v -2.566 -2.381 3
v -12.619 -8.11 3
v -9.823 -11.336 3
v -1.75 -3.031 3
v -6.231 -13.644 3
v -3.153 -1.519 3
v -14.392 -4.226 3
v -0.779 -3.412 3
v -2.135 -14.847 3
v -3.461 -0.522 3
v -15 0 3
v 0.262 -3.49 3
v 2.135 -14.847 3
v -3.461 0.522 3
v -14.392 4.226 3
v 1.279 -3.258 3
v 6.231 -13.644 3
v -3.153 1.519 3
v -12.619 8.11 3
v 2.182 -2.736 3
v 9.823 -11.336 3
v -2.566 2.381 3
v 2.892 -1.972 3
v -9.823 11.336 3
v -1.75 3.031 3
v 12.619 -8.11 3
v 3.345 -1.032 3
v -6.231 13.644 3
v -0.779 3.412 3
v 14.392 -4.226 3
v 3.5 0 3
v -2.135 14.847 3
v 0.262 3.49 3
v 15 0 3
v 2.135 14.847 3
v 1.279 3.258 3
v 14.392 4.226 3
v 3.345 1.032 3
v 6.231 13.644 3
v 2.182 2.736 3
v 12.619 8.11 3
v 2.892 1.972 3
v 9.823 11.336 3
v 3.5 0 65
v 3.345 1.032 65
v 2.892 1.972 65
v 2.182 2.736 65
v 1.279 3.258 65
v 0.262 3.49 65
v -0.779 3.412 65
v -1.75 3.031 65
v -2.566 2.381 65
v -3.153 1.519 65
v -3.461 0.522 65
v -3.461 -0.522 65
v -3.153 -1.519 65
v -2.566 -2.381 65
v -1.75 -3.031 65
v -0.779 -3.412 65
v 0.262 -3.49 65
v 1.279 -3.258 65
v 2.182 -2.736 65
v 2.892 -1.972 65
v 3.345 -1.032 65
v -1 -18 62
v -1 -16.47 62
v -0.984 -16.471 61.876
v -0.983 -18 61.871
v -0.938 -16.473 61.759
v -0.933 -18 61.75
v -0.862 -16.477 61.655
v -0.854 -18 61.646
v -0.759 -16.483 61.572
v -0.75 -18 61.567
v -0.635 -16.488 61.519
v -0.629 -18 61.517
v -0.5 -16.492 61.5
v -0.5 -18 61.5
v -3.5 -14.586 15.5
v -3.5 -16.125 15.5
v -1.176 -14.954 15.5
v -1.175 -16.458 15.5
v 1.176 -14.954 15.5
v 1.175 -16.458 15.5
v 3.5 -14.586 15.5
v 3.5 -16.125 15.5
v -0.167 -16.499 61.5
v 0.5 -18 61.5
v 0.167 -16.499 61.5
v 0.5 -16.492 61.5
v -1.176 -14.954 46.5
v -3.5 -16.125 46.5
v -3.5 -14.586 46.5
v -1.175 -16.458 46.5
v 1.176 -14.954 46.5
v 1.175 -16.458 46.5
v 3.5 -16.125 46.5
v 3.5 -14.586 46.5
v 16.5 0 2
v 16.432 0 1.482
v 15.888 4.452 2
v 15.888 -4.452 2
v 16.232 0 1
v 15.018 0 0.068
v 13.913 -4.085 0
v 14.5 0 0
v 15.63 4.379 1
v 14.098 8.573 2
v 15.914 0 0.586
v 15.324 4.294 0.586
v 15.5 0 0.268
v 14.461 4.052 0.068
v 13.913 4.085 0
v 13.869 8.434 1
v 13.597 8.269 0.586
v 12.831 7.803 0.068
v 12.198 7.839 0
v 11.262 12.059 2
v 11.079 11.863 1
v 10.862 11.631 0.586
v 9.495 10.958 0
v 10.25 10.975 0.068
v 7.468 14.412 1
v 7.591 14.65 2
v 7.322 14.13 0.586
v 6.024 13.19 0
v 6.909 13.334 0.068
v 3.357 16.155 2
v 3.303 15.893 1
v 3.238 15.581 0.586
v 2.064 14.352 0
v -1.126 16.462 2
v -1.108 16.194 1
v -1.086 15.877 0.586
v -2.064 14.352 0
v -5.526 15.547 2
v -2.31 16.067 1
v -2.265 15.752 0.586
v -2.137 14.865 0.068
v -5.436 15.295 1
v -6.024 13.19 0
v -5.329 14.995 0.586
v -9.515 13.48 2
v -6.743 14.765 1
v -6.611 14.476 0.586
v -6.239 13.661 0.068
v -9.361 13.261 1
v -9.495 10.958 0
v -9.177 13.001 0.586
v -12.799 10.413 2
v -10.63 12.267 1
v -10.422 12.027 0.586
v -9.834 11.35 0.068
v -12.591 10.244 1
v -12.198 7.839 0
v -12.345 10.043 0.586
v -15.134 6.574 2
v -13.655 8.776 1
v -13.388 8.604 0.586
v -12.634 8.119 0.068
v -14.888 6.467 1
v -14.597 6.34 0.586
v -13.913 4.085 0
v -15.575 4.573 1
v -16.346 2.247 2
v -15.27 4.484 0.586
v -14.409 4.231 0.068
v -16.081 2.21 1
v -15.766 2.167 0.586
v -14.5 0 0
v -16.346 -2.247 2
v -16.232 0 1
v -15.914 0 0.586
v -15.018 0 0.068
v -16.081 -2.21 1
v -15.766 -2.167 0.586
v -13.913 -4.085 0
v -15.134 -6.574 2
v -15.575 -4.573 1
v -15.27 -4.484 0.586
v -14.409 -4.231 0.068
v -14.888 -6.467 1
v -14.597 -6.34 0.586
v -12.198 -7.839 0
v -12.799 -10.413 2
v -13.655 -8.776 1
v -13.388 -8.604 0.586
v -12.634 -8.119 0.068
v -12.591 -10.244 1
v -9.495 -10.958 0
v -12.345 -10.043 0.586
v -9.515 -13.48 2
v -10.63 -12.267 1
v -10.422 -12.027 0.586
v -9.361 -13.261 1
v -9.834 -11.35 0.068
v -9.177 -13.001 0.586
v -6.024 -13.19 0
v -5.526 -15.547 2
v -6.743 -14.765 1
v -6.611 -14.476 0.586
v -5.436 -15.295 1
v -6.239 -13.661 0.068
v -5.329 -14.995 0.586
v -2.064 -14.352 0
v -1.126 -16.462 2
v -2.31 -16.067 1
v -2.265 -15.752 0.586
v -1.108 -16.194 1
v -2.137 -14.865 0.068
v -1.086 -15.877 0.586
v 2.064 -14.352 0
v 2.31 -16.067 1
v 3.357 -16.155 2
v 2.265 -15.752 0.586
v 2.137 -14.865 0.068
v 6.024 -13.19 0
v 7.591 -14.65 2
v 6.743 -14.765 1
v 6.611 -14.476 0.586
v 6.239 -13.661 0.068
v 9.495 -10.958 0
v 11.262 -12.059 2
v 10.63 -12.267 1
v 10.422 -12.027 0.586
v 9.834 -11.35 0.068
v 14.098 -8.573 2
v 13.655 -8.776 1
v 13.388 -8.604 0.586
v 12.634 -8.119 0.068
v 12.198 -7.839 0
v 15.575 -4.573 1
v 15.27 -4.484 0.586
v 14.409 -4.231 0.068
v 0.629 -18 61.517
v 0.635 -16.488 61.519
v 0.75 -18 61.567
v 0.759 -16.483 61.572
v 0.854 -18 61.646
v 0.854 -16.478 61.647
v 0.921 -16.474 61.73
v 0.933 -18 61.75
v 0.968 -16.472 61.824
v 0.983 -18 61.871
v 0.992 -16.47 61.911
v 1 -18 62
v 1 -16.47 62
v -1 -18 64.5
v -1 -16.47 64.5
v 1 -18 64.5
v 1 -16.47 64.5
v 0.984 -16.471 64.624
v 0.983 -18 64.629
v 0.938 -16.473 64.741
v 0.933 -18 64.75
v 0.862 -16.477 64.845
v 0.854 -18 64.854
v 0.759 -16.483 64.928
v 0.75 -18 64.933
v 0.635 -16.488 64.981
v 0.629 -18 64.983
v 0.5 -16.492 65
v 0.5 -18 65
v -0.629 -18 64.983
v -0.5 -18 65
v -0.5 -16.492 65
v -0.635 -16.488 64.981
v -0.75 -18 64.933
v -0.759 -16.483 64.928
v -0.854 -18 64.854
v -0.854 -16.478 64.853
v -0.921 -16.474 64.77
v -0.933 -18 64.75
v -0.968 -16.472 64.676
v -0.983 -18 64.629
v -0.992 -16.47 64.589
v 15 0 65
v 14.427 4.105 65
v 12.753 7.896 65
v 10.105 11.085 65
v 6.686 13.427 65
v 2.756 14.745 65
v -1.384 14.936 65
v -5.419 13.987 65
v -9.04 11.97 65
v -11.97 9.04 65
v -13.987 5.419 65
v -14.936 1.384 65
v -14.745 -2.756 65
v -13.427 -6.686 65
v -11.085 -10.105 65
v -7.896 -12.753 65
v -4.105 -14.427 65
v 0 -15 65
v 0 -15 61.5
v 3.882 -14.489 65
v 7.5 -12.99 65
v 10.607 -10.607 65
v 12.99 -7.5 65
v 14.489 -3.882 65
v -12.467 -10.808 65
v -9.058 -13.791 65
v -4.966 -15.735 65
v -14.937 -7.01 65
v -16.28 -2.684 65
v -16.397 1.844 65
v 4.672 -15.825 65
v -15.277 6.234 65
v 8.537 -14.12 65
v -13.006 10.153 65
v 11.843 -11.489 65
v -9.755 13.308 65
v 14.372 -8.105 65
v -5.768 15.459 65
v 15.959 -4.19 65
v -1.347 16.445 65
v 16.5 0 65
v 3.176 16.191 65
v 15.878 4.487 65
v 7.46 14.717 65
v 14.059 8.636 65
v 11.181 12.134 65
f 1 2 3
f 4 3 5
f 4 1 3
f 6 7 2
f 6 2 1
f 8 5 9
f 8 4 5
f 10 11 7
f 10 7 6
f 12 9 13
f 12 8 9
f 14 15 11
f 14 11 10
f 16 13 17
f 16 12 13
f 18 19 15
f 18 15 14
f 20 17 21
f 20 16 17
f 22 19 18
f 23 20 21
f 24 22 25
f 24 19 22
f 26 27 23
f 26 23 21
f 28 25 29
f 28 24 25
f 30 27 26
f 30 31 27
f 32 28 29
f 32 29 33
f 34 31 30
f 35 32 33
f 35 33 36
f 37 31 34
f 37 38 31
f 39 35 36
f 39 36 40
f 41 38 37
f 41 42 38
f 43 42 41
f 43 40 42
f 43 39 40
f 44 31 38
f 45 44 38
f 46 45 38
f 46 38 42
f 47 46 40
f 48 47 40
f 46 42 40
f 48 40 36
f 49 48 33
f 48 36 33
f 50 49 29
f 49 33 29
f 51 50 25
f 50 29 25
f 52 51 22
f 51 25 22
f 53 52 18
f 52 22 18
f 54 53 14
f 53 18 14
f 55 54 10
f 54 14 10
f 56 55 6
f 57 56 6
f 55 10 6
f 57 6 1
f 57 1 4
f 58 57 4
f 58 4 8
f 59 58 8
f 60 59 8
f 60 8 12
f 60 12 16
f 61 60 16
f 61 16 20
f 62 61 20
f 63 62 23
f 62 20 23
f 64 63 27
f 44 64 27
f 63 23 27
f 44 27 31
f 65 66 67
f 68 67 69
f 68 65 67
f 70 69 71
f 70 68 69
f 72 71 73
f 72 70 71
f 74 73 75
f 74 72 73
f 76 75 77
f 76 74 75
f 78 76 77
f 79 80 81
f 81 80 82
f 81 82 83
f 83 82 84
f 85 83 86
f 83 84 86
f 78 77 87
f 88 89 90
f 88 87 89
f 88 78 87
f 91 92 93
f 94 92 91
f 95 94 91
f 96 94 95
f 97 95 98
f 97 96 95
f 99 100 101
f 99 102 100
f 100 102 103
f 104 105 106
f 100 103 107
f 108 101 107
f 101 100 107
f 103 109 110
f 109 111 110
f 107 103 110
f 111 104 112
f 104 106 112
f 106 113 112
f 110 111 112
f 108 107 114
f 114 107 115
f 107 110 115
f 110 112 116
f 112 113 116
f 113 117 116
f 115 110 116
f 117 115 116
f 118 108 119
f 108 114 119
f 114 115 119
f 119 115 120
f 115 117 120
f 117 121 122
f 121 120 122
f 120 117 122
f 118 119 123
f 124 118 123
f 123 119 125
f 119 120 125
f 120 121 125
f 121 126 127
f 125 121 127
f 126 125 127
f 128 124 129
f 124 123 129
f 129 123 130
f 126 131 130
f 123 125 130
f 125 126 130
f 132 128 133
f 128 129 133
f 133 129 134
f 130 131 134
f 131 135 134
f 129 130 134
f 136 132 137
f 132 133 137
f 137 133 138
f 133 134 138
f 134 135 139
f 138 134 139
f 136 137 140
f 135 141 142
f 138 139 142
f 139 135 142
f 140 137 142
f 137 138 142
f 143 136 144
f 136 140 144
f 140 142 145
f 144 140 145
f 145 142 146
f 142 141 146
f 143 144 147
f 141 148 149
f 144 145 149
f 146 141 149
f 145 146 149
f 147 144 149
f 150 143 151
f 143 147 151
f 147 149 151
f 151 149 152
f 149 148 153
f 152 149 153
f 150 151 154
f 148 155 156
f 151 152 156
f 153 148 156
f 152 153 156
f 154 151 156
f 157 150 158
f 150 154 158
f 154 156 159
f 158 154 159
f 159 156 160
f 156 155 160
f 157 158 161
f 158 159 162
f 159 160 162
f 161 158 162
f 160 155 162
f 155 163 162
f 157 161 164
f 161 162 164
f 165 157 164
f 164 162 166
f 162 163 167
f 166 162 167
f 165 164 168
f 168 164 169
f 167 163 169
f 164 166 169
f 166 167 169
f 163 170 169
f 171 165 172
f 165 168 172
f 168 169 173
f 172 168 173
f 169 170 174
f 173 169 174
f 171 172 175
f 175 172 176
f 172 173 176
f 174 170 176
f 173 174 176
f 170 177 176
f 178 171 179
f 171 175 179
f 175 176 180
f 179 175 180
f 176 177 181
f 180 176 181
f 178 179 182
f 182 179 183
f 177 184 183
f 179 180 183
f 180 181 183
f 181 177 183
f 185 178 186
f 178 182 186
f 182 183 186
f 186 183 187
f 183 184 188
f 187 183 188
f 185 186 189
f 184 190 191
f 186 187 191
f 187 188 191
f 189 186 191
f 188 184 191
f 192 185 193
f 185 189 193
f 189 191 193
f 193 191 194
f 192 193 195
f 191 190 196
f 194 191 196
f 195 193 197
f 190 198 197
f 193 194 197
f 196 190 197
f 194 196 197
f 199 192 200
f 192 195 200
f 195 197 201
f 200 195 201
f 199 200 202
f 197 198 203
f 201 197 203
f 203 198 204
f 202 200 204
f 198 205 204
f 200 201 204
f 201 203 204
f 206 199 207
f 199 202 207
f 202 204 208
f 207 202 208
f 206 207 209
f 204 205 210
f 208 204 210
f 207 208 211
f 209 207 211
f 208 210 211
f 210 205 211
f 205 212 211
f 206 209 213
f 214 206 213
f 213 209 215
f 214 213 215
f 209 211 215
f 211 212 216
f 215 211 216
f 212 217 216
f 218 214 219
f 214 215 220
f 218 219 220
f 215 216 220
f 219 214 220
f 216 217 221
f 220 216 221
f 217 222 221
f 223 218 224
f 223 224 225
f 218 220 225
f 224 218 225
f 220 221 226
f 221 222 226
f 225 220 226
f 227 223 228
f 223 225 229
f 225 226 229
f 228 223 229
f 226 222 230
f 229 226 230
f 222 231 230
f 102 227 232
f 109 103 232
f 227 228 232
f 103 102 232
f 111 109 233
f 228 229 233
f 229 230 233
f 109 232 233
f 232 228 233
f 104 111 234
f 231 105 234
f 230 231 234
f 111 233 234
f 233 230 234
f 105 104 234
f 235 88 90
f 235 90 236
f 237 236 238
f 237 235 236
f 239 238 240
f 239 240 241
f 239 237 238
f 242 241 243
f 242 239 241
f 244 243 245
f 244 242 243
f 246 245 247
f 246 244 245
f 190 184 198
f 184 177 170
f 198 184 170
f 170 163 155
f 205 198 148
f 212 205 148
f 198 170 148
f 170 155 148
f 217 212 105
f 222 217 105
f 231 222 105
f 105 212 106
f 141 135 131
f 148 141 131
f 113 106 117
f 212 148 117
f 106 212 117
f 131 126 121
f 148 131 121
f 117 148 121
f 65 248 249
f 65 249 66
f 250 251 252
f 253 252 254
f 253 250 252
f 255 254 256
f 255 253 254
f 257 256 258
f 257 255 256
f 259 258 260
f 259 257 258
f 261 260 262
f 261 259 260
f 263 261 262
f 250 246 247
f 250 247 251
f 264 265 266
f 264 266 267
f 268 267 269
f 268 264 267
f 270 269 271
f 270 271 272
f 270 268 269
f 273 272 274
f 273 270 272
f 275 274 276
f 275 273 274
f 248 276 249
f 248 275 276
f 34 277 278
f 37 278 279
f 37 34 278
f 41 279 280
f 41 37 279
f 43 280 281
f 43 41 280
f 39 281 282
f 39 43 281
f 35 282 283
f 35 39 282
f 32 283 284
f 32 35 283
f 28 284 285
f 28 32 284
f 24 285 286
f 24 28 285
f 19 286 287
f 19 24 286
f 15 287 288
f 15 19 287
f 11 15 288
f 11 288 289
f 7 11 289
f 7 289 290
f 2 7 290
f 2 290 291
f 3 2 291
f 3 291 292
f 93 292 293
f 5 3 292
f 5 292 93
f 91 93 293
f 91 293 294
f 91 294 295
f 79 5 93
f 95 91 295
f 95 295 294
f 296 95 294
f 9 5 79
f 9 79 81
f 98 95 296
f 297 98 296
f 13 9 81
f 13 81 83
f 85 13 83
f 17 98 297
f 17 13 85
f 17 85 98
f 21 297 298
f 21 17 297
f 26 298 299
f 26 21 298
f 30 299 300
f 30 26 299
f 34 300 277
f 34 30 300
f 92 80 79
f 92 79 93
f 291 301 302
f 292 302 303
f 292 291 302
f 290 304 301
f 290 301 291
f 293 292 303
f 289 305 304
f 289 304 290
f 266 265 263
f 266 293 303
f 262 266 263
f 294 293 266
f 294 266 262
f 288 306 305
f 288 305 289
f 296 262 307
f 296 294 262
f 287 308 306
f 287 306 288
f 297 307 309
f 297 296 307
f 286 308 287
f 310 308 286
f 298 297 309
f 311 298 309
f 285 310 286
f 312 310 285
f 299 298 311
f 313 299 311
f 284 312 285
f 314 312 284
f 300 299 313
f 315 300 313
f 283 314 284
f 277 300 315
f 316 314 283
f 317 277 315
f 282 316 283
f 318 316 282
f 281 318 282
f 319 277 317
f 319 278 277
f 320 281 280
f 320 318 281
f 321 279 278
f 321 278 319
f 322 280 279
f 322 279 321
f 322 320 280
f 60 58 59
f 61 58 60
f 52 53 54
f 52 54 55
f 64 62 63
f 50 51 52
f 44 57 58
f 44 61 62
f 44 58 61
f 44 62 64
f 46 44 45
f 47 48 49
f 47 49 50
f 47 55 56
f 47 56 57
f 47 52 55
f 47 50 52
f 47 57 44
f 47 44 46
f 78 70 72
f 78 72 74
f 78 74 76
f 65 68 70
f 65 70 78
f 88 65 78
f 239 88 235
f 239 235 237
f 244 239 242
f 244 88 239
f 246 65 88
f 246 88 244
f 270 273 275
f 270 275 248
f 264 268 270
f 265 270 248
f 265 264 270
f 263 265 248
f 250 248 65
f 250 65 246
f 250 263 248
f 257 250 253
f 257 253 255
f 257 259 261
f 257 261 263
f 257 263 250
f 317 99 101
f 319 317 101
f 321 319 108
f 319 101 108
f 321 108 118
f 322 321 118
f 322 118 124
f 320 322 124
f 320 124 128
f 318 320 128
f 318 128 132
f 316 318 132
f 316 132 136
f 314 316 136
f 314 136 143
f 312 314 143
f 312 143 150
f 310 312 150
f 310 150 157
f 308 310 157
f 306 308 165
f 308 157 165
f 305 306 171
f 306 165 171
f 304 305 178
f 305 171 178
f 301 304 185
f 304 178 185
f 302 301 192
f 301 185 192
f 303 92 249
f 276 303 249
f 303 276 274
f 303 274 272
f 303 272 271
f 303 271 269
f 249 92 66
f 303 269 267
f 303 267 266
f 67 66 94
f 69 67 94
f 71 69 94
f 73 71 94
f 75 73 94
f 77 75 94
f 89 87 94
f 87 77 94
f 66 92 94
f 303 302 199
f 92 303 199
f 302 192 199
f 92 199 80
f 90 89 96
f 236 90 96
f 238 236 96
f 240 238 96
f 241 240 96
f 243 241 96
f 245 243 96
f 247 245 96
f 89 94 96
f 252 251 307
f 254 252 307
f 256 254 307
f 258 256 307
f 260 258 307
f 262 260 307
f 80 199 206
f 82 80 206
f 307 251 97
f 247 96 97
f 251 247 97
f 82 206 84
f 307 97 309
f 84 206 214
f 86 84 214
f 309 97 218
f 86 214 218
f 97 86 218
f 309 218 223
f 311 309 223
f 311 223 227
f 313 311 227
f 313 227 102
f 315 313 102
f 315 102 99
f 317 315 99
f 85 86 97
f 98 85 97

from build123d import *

# Parameters (mm, degrees)
F0_R      = 16.5
F0_R_2    = 15
F1_DEPTH  = 3
F2_R      = 16.5
F2_R_2    = 15
F3_DEPTH  = 62
F4_R      = 3.5
F5_DEPTH  = 62
F7_W      = 7
F7_H      = 31
F8_DEPTH  = 20
F11_DEPTH = 1.5
F12_R     = 2


with BuildPart() as f1:
    # F0 (on Top) → F1 (new body)
    with BuildSketch(Plane.XY):
        Circle(F0_R)
        Circle(F0_R_2, mode=Mode.SUBTRACT)
        Circle(F0_R_2)
    extrude(amount=F1_DEPTH)

    # F2 (on face) → F3 (join)
    with BuildSketch(Plane.XY.offset(3)):
        Circle(F2_R)
        Circle(F2_R_2, mode=Mode.SUBTRACT)
    extrude(amount=F3_DEPTH)

    # F4 (on face) → F5 (join)
    with BuildSketch(Plane.XY.offset(3)):
        Circle(F4_R)
    extrude(amount=F5_DEPTH)

    # F7 (on offset) → F8 (cut)
    with BuildSketch(Plane.XZ.offset(30)):
        with Locations((0, 31)):
            Rectangle(F7_W, F7_H)
    extrude(amount=-F8_DEPTH, mode=Mode.SUBTRACT)

    # F10 (on offset) → F11 (join, symmetric)
    with BuildSketch(Plane.XZ.offset(16.5)):
        with BuildLine():
            Line((0.5, 65), (0, 65))
            Line((0, 65), (-0.5, 65))
            ThreePointArc((-0.5, 65), (-0.853553, 64.853553), (-1, 64.5))
            Line((-1, 64.5), (-1, 62))
            ThreePointArc((-1, 62), (-0.853553, 61.646447), (-0.5, 61.5))
            Line((-0.5, 61.5), (0.5, 61.5))
            ThreePointArc((0.5, 61.5), (0.853553, 61.646447), (1, 62))
            Line((1, 62), (1, 64.5))
            ThreePointArc((1, 64.5), (0.853553, 64.853553), (0.5, 65))
        make_face()
    extrude(amount=F11_DEPTH, both=True)

    # F12
    f12_edges = [f1.edges().sort_by_distance(p)[0] for p in [
        (-16.5, 0, 0),
    ]]
    fillet(f12_edges, radius=F12_R)


solid = f1.part
